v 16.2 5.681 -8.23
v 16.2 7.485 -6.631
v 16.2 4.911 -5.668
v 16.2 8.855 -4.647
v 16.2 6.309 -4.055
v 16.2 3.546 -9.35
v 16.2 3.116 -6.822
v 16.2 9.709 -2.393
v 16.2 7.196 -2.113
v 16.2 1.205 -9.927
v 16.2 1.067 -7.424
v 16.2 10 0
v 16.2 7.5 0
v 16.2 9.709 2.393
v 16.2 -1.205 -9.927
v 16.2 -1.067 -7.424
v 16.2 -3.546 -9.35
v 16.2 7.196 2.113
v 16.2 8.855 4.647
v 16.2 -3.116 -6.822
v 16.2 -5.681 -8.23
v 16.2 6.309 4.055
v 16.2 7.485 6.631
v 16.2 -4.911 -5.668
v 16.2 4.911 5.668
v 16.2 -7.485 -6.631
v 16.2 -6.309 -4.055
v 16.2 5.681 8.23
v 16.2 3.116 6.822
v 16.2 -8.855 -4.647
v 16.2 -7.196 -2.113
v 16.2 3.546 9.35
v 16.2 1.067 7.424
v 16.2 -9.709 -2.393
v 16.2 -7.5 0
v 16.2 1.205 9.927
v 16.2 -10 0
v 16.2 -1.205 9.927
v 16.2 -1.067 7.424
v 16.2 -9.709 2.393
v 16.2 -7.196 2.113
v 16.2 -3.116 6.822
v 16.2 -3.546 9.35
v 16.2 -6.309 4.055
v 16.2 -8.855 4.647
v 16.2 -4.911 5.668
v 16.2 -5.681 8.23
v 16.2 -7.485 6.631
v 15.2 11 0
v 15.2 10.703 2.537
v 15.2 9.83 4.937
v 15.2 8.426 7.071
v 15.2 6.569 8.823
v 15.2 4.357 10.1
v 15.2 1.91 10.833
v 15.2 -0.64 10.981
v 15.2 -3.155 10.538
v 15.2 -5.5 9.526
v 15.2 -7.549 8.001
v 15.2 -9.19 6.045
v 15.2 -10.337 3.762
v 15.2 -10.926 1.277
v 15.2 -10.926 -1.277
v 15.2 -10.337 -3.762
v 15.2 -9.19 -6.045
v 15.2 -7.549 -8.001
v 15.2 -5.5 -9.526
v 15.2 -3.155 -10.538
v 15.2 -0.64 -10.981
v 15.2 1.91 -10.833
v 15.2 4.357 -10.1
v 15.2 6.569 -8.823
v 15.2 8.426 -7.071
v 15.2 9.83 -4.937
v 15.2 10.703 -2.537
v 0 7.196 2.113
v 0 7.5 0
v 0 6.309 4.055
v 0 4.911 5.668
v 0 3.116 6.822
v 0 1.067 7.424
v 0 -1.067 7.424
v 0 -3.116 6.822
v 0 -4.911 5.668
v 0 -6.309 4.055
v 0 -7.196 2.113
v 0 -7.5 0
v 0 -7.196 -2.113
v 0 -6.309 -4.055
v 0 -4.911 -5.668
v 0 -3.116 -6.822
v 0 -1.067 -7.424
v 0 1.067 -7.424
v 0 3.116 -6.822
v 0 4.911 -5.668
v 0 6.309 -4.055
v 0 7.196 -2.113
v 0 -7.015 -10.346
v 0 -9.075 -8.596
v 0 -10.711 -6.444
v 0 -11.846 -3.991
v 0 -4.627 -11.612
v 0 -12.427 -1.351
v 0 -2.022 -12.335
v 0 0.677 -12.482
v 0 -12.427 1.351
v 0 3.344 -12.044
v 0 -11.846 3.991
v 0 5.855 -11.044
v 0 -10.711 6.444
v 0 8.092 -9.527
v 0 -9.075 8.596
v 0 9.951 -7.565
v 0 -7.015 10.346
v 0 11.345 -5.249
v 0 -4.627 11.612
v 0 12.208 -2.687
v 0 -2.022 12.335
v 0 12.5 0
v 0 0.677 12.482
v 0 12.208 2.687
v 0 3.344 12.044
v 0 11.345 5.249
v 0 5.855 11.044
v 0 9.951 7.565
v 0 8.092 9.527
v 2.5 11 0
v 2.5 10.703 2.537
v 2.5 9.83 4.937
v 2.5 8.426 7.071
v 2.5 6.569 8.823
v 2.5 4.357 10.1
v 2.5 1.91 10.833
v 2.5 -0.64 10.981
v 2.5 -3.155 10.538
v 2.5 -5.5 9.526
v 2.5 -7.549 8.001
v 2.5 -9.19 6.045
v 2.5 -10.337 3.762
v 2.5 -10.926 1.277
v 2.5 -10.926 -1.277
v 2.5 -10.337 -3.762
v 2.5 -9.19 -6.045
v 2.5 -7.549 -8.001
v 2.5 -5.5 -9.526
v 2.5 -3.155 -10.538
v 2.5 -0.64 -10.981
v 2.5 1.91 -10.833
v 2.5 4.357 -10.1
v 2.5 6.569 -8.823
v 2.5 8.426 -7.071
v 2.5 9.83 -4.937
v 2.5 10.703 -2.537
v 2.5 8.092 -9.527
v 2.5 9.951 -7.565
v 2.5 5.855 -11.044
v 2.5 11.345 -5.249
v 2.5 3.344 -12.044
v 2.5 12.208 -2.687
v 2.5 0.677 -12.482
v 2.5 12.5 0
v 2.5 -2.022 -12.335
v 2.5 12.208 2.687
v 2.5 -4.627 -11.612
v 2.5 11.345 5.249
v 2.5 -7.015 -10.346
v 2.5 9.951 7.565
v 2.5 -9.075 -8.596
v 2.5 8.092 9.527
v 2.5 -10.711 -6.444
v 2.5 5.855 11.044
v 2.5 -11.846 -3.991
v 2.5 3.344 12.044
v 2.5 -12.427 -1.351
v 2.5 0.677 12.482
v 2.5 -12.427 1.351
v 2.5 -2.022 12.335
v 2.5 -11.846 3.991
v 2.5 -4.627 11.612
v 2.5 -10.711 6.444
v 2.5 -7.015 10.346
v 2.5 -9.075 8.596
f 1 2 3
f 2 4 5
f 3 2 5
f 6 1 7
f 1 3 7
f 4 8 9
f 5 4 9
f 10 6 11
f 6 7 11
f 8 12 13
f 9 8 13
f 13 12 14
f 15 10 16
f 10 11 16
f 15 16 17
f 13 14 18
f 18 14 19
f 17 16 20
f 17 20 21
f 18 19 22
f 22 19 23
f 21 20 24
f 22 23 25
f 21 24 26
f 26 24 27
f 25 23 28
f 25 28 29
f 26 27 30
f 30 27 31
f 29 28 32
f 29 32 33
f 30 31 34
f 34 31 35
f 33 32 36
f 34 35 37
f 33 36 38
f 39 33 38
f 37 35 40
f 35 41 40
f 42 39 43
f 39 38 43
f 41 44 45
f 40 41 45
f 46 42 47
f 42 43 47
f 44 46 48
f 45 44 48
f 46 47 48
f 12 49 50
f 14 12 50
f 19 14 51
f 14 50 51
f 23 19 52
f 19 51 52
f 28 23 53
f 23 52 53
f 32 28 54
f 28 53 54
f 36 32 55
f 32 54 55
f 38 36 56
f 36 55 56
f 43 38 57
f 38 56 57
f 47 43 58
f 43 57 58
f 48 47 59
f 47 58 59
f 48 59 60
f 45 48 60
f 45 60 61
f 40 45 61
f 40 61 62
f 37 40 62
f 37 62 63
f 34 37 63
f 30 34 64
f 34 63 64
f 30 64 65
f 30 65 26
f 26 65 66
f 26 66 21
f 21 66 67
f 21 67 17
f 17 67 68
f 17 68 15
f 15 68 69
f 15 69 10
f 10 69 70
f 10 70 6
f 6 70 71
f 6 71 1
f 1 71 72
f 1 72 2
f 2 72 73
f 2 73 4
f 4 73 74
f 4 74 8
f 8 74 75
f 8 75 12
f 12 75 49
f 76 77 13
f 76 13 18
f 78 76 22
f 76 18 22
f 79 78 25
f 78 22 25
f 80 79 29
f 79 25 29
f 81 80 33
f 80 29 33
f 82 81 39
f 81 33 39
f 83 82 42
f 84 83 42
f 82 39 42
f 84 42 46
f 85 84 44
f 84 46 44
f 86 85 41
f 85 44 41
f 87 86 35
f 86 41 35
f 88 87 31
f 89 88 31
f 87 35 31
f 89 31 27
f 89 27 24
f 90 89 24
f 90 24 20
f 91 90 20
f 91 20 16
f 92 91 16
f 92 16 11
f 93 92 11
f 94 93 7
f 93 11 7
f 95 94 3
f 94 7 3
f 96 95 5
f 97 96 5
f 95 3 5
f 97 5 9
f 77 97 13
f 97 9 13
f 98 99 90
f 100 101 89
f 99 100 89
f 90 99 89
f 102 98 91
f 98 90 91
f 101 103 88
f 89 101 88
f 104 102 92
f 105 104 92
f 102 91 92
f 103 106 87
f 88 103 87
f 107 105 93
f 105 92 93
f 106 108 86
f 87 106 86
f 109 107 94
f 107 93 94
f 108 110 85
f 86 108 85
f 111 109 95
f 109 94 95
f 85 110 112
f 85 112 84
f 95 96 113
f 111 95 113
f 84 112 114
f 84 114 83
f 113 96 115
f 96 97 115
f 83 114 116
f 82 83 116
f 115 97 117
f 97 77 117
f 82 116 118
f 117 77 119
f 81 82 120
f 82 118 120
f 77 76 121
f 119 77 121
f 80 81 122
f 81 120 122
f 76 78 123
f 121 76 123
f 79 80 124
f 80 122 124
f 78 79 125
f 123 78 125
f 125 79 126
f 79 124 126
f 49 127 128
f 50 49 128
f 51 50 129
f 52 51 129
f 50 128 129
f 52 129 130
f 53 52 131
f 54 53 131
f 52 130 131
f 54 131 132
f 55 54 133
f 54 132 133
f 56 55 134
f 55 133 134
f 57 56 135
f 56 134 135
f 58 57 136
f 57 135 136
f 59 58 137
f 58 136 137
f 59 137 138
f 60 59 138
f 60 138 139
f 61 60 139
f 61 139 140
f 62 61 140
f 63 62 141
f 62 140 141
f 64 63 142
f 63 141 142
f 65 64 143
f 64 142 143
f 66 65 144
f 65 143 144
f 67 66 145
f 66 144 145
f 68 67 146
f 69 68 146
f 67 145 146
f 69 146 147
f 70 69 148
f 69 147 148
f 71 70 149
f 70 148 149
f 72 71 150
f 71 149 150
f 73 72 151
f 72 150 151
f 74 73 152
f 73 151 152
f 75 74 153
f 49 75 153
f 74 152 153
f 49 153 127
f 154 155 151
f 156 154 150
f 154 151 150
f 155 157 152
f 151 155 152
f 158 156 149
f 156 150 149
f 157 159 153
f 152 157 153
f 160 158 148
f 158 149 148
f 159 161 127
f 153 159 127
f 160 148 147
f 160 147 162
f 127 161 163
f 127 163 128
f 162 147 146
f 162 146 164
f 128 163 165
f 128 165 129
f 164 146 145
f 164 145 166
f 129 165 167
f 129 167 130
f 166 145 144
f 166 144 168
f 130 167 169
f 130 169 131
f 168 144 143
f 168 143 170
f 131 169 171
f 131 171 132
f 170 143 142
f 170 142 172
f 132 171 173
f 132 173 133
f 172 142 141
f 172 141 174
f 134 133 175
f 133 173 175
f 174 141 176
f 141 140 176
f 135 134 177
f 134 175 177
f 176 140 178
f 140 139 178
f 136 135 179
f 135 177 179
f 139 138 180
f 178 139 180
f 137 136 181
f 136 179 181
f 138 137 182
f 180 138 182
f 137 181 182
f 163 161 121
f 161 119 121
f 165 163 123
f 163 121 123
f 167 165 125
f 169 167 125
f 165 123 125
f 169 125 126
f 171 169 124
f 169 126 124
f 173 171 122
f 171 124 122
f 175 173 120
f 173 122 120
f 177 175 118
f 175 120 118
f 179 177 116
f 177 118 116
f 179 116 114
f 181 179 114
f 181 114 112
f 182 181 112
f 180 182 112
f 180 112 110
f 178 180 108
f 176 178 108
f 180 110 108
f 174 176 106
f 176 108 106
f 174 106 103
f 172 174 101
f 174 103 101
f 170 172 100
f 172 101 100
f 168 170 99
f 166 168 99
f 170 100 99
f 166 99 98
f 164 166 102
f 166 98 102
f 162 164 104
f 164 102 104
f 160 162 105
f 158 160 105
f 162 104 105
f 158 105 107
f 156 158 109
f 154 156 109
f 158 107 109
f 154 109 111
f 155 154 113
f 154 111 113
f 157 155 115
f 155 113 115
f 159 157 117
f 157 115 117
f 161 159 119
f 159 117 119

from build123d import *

# Parameters (mm, degrees)
F2_SIZE = 1


with BuildPart() as f1:
    # F0 (on Top) → F1 (revolve)
    with BuildSketch(Plane.XY):
        Polygon((0, 12.5), (0, 7.5), (16.2, 7.5), (16.2, 11), (2.5, 11), (2.5, 12.5), align=None)
    revolve(axis=Axis((6.446342, 0, 0), (1, 0, 0)))

    # F2
    f2_edges = [f1.edges().sort_by_distance(p)[0] for p in [
        (16.2, -11, 0),
    ]]
    chamfer(f2_edges, length=F2_SIZE)


solid = f1.part
